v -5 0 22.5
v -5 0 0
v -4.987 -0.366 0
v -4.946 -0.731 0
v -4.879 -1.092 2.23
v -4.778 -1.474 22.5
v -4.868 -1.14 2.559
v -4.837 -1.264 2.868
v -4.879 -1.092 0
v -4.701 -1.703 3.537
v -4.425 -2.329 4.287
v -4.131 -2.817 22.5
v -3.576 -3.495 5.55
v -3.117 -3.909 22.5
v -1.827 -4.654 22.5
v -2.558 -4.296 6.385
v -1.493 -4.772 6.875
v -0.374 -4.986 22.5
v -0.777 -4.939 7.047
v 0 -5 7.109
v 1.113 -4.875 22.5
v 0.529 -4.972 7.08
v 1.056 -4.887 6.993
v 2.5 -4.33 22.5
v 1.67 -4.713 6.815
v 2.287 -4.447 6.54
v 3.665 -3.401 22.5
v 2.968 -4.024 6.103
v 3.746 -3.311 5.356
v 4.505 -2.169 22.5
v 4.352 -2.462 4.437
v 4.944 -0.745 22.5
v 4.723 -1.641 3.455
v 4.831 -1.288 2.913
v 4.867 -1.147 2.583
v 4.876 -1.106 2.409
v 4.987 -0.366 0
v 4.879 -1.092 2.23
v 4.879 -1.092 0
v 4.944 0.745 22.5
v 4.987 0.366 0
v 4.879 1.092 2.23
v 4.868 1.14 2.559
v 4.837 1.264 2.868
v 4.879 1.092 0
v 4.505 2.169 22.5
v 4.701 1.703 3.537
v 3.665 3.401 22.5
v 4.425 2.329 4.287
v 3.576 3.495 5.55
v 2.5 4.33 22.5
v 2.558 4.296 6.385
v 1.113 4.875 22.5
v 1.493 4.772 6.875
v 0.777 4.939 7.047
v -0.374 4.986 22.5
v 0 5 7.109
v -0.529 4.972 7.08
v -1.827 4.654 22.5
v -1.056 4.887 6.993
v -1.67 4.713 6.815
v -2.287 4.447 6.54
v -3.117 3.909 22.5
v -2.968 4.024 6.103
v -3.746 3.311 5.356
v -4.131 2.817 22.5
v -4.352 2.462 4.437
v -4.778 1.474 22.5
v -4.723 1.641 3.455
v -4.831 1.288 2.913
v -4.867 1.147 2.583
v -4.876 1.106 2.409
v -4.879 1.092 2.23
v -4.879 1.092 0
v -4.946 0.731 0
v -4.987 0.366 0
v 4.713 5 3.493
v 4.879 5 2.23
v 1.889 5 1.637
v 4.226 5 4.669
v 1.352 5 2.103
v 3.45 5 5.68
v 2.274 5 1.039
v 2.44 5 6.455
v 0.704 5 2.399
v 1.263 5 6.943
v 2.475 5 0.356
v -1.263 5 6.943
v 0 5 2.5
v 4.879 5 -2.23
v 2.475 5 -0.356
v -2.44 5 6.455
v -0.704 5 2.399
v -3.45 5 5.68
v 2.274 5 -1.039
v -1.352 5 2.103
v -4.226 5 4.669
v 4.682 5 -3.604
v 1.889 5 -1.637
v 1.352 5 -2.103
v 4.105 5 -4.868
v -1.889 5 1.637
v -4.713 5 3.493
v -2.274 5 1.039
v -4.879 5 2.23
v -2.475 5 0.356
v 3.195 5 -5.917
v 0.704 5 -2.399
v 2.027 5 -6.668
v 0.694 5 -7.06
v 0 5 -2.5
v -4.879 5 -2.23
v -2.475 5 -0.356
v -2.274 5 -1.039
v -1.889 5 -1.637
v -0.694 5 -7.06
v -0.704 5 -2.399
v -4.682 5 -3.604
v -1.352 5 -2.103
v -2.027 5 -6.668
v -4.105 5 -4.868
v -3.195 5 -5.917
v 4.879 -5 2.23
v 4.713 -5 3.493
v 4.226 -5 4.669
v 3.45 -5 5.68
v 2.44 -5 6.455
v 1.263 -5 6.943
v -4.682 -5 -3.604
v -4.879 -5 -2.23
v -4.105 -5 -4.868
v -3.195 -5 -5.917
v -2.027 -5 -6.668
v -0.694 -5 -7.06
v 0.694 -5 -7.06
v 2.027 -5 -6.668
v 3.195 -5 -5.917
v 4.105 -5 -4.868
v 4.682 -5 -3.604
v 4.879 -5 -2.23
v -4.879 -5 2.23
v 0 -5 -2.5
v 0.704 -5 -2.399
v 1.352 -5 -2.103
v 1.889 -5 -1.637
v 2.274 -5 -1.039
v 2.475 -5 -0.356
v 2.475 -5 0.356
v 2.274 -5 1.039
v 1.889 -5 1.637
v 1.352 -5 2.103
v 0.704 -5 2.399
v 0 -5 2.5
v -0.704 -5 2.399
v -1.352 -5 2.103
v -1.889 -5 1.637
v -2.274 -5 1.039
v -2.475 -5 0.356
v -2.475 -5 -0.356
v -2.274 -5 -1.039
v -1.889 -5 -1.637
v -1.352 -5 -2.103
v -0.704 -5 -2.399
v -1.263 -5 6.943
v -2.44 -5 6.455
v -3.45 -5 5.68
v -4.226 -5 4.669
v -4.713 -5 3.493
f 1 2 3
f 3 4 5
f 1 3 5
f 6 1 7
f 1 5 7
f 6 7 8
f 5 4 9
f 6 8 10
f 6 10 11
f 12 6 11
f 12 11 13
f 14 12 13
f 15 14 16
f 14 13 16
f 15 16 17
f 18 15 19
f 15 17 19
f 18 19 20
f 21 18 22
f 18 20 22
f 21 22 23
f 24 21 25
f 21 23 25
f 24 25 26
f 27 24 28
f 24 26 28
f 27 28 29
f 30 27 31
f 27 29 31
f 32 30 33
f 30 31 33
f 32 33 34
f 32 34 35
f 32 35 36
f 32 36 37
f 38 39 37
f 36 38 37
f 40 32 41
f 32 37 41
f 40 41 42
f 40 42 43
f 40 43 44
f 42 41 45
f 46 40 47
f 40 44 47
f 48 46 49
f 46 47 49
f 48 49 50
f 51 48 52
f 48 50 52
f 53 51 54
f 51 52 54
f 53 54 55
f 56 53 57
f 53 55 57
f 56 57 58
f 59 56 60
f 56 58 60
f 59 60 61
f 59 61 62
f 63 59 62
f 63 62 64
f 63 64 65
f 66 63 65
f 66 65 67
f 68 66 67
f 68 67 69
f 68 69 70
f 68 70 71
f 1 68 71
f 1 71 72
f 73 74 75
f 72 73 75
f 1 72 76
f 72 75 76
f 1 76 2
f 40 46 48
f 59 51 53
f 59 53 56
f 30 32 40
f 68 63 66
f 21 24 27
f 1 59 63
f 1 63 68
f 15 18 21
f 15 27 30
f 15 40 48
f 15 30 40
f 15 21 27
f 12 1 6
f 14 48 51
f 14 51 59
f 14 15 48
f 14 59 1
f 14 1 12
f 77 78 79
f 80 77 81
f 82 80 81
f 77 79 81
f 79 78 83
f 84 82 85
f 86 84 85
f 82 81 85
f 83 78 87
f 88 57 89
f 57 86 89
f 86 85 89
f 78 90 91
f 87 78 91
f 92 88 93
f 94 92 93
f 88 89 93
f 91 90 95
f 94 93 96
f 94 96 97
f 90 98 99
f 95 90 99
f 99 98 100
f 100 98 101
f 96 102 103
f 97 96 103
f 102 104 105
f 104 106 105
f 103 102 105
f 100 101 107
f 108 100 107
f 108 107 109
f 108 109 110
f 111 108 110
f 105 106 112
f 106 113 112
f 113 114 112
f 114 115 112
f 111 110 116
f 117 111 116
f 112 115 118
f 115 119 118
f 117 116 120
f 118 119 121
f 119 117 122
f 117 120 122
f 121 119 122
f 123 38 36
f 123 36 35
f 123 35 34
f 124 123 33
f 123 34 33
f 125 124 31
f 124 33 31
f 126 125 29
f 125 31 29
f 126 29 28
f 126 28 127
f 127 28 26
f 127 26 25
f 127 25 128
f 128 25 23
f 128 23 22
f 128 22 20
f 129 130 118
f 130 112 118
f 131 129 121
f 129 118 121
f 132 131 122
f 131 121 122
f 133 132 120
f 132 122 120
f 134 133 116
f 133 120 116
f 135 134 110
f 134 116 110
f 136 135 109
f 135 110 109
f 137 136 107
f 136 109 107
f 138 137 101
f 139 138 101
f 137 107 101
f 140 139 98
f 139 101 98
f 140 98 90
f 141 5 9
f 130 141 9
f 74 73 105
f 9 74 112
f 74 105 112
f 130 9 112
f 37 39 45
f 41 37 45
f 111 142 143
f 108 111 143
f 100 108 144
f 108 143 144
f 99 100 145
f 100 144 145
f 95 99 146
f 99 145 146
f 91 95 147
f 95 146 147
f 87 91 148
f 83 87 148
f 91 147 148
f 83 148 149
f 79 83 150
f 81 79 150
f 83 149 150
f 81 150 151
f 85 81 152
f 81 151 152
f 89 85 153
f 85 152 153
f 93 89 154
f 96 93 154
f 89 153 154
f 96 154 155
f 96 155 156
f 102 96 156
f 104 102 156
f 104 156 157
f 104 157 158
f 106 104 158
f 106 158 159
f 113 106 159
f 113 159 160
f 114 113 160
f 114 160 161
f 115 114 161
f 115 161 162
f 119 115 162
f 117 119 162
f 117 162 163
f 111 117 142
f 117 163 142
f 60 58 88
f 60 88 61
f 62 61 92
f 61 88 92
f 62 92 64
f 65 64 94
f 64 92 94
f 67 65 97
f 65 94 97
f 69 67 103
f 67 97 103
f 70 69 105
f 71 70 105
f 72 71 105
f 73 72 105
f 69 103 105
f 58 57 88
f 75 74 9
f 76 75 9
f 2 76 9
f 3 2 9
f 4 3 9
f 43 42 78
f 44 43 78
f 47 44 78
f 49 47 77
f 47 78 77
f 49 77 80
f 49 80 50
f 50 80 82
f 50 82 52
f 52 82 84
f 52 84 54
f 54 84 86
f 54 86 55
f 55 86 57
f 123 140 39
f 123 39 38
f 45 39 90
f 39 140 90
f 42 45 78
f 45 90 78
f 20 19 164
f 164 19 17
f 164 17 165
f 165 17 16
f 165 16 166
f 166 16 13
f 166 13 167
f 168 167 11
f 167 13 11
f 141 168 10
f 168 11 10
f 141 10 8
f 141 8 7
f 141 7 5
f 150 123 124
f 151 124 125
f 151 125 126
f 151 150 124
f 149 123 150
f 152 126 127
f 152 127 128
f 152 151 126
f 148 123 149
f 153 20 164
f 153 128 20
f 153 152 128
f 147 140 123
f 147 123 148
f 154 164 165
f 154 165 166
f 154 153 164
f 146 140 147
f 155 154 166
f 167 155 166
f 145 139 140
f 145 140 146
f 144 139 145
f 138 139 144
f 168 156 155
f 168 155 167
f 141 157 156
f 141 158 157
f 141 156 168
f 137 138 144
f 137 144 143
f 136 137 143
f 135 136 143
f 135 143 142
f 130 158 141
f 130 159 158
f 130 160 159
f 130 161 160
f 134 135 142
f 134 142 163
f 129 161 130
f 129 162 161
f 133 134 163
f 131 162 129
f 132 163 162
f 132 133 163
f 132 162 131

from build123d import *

# Parameters (mm, degrees)
SKETCH2_R           = 5
BOSS_EXTRUDE2_DEPTH = 22.5
BOSS_EXTRUDE3_DEPTH = 5
SKETCH4_R           = 2.5
CUT_EXTRUDE1_DEPTH  = 15


with BuildPart() as part:
    # Sketch2 → Boss-Extrude2 (new body)
    with BuildSketch(Plane.XY):
        with Locations(Location((0, 0, 0), (0, 0, 180))):
            Circle(SKETCH2_R)
    extrude(amount=BOSS_EXTRUDE2_DEPTH)

    # Sketch3 → Boss-Extrude3 (add, symmetric)
    with BuildSketch(Plane(origin=(0, 0, 0), x_dir=(1, 0, 0), z_dir=(0, 1, 0))):
        with BuildLine():
            Line((-4.879396794, -2.229791716), (-4.879396794, 2.229791716))
            ThreePointArc((-4.879396794, 2.229791716), (0, 7.10918851), (4.879396794, 2.229791716))
            Line((4.879396794, 2.229791716), (4.879396794, -2.229791716))
            ThreePointArc((4.879396794, -2.229791716), (0, -7.10918851), (-4.879396794, -2.229791716))
        make_face()
    extrude(amount=BOSS_EXTRUDE3_DEPTH, both=True)

    # Sketch4 → Cut-Extrude1 (cut)
    with BuildSketch(Plane.XZ.offset(5)):
        with Locations(Location((0, 0, 0), (0, 0, 270))):
            Circle(SKETCH4_R)
    extrude(amount=-CUT_EXTRUDE1_DEPTH, mode=Mode.SUBTRACT)


solid = part.part
